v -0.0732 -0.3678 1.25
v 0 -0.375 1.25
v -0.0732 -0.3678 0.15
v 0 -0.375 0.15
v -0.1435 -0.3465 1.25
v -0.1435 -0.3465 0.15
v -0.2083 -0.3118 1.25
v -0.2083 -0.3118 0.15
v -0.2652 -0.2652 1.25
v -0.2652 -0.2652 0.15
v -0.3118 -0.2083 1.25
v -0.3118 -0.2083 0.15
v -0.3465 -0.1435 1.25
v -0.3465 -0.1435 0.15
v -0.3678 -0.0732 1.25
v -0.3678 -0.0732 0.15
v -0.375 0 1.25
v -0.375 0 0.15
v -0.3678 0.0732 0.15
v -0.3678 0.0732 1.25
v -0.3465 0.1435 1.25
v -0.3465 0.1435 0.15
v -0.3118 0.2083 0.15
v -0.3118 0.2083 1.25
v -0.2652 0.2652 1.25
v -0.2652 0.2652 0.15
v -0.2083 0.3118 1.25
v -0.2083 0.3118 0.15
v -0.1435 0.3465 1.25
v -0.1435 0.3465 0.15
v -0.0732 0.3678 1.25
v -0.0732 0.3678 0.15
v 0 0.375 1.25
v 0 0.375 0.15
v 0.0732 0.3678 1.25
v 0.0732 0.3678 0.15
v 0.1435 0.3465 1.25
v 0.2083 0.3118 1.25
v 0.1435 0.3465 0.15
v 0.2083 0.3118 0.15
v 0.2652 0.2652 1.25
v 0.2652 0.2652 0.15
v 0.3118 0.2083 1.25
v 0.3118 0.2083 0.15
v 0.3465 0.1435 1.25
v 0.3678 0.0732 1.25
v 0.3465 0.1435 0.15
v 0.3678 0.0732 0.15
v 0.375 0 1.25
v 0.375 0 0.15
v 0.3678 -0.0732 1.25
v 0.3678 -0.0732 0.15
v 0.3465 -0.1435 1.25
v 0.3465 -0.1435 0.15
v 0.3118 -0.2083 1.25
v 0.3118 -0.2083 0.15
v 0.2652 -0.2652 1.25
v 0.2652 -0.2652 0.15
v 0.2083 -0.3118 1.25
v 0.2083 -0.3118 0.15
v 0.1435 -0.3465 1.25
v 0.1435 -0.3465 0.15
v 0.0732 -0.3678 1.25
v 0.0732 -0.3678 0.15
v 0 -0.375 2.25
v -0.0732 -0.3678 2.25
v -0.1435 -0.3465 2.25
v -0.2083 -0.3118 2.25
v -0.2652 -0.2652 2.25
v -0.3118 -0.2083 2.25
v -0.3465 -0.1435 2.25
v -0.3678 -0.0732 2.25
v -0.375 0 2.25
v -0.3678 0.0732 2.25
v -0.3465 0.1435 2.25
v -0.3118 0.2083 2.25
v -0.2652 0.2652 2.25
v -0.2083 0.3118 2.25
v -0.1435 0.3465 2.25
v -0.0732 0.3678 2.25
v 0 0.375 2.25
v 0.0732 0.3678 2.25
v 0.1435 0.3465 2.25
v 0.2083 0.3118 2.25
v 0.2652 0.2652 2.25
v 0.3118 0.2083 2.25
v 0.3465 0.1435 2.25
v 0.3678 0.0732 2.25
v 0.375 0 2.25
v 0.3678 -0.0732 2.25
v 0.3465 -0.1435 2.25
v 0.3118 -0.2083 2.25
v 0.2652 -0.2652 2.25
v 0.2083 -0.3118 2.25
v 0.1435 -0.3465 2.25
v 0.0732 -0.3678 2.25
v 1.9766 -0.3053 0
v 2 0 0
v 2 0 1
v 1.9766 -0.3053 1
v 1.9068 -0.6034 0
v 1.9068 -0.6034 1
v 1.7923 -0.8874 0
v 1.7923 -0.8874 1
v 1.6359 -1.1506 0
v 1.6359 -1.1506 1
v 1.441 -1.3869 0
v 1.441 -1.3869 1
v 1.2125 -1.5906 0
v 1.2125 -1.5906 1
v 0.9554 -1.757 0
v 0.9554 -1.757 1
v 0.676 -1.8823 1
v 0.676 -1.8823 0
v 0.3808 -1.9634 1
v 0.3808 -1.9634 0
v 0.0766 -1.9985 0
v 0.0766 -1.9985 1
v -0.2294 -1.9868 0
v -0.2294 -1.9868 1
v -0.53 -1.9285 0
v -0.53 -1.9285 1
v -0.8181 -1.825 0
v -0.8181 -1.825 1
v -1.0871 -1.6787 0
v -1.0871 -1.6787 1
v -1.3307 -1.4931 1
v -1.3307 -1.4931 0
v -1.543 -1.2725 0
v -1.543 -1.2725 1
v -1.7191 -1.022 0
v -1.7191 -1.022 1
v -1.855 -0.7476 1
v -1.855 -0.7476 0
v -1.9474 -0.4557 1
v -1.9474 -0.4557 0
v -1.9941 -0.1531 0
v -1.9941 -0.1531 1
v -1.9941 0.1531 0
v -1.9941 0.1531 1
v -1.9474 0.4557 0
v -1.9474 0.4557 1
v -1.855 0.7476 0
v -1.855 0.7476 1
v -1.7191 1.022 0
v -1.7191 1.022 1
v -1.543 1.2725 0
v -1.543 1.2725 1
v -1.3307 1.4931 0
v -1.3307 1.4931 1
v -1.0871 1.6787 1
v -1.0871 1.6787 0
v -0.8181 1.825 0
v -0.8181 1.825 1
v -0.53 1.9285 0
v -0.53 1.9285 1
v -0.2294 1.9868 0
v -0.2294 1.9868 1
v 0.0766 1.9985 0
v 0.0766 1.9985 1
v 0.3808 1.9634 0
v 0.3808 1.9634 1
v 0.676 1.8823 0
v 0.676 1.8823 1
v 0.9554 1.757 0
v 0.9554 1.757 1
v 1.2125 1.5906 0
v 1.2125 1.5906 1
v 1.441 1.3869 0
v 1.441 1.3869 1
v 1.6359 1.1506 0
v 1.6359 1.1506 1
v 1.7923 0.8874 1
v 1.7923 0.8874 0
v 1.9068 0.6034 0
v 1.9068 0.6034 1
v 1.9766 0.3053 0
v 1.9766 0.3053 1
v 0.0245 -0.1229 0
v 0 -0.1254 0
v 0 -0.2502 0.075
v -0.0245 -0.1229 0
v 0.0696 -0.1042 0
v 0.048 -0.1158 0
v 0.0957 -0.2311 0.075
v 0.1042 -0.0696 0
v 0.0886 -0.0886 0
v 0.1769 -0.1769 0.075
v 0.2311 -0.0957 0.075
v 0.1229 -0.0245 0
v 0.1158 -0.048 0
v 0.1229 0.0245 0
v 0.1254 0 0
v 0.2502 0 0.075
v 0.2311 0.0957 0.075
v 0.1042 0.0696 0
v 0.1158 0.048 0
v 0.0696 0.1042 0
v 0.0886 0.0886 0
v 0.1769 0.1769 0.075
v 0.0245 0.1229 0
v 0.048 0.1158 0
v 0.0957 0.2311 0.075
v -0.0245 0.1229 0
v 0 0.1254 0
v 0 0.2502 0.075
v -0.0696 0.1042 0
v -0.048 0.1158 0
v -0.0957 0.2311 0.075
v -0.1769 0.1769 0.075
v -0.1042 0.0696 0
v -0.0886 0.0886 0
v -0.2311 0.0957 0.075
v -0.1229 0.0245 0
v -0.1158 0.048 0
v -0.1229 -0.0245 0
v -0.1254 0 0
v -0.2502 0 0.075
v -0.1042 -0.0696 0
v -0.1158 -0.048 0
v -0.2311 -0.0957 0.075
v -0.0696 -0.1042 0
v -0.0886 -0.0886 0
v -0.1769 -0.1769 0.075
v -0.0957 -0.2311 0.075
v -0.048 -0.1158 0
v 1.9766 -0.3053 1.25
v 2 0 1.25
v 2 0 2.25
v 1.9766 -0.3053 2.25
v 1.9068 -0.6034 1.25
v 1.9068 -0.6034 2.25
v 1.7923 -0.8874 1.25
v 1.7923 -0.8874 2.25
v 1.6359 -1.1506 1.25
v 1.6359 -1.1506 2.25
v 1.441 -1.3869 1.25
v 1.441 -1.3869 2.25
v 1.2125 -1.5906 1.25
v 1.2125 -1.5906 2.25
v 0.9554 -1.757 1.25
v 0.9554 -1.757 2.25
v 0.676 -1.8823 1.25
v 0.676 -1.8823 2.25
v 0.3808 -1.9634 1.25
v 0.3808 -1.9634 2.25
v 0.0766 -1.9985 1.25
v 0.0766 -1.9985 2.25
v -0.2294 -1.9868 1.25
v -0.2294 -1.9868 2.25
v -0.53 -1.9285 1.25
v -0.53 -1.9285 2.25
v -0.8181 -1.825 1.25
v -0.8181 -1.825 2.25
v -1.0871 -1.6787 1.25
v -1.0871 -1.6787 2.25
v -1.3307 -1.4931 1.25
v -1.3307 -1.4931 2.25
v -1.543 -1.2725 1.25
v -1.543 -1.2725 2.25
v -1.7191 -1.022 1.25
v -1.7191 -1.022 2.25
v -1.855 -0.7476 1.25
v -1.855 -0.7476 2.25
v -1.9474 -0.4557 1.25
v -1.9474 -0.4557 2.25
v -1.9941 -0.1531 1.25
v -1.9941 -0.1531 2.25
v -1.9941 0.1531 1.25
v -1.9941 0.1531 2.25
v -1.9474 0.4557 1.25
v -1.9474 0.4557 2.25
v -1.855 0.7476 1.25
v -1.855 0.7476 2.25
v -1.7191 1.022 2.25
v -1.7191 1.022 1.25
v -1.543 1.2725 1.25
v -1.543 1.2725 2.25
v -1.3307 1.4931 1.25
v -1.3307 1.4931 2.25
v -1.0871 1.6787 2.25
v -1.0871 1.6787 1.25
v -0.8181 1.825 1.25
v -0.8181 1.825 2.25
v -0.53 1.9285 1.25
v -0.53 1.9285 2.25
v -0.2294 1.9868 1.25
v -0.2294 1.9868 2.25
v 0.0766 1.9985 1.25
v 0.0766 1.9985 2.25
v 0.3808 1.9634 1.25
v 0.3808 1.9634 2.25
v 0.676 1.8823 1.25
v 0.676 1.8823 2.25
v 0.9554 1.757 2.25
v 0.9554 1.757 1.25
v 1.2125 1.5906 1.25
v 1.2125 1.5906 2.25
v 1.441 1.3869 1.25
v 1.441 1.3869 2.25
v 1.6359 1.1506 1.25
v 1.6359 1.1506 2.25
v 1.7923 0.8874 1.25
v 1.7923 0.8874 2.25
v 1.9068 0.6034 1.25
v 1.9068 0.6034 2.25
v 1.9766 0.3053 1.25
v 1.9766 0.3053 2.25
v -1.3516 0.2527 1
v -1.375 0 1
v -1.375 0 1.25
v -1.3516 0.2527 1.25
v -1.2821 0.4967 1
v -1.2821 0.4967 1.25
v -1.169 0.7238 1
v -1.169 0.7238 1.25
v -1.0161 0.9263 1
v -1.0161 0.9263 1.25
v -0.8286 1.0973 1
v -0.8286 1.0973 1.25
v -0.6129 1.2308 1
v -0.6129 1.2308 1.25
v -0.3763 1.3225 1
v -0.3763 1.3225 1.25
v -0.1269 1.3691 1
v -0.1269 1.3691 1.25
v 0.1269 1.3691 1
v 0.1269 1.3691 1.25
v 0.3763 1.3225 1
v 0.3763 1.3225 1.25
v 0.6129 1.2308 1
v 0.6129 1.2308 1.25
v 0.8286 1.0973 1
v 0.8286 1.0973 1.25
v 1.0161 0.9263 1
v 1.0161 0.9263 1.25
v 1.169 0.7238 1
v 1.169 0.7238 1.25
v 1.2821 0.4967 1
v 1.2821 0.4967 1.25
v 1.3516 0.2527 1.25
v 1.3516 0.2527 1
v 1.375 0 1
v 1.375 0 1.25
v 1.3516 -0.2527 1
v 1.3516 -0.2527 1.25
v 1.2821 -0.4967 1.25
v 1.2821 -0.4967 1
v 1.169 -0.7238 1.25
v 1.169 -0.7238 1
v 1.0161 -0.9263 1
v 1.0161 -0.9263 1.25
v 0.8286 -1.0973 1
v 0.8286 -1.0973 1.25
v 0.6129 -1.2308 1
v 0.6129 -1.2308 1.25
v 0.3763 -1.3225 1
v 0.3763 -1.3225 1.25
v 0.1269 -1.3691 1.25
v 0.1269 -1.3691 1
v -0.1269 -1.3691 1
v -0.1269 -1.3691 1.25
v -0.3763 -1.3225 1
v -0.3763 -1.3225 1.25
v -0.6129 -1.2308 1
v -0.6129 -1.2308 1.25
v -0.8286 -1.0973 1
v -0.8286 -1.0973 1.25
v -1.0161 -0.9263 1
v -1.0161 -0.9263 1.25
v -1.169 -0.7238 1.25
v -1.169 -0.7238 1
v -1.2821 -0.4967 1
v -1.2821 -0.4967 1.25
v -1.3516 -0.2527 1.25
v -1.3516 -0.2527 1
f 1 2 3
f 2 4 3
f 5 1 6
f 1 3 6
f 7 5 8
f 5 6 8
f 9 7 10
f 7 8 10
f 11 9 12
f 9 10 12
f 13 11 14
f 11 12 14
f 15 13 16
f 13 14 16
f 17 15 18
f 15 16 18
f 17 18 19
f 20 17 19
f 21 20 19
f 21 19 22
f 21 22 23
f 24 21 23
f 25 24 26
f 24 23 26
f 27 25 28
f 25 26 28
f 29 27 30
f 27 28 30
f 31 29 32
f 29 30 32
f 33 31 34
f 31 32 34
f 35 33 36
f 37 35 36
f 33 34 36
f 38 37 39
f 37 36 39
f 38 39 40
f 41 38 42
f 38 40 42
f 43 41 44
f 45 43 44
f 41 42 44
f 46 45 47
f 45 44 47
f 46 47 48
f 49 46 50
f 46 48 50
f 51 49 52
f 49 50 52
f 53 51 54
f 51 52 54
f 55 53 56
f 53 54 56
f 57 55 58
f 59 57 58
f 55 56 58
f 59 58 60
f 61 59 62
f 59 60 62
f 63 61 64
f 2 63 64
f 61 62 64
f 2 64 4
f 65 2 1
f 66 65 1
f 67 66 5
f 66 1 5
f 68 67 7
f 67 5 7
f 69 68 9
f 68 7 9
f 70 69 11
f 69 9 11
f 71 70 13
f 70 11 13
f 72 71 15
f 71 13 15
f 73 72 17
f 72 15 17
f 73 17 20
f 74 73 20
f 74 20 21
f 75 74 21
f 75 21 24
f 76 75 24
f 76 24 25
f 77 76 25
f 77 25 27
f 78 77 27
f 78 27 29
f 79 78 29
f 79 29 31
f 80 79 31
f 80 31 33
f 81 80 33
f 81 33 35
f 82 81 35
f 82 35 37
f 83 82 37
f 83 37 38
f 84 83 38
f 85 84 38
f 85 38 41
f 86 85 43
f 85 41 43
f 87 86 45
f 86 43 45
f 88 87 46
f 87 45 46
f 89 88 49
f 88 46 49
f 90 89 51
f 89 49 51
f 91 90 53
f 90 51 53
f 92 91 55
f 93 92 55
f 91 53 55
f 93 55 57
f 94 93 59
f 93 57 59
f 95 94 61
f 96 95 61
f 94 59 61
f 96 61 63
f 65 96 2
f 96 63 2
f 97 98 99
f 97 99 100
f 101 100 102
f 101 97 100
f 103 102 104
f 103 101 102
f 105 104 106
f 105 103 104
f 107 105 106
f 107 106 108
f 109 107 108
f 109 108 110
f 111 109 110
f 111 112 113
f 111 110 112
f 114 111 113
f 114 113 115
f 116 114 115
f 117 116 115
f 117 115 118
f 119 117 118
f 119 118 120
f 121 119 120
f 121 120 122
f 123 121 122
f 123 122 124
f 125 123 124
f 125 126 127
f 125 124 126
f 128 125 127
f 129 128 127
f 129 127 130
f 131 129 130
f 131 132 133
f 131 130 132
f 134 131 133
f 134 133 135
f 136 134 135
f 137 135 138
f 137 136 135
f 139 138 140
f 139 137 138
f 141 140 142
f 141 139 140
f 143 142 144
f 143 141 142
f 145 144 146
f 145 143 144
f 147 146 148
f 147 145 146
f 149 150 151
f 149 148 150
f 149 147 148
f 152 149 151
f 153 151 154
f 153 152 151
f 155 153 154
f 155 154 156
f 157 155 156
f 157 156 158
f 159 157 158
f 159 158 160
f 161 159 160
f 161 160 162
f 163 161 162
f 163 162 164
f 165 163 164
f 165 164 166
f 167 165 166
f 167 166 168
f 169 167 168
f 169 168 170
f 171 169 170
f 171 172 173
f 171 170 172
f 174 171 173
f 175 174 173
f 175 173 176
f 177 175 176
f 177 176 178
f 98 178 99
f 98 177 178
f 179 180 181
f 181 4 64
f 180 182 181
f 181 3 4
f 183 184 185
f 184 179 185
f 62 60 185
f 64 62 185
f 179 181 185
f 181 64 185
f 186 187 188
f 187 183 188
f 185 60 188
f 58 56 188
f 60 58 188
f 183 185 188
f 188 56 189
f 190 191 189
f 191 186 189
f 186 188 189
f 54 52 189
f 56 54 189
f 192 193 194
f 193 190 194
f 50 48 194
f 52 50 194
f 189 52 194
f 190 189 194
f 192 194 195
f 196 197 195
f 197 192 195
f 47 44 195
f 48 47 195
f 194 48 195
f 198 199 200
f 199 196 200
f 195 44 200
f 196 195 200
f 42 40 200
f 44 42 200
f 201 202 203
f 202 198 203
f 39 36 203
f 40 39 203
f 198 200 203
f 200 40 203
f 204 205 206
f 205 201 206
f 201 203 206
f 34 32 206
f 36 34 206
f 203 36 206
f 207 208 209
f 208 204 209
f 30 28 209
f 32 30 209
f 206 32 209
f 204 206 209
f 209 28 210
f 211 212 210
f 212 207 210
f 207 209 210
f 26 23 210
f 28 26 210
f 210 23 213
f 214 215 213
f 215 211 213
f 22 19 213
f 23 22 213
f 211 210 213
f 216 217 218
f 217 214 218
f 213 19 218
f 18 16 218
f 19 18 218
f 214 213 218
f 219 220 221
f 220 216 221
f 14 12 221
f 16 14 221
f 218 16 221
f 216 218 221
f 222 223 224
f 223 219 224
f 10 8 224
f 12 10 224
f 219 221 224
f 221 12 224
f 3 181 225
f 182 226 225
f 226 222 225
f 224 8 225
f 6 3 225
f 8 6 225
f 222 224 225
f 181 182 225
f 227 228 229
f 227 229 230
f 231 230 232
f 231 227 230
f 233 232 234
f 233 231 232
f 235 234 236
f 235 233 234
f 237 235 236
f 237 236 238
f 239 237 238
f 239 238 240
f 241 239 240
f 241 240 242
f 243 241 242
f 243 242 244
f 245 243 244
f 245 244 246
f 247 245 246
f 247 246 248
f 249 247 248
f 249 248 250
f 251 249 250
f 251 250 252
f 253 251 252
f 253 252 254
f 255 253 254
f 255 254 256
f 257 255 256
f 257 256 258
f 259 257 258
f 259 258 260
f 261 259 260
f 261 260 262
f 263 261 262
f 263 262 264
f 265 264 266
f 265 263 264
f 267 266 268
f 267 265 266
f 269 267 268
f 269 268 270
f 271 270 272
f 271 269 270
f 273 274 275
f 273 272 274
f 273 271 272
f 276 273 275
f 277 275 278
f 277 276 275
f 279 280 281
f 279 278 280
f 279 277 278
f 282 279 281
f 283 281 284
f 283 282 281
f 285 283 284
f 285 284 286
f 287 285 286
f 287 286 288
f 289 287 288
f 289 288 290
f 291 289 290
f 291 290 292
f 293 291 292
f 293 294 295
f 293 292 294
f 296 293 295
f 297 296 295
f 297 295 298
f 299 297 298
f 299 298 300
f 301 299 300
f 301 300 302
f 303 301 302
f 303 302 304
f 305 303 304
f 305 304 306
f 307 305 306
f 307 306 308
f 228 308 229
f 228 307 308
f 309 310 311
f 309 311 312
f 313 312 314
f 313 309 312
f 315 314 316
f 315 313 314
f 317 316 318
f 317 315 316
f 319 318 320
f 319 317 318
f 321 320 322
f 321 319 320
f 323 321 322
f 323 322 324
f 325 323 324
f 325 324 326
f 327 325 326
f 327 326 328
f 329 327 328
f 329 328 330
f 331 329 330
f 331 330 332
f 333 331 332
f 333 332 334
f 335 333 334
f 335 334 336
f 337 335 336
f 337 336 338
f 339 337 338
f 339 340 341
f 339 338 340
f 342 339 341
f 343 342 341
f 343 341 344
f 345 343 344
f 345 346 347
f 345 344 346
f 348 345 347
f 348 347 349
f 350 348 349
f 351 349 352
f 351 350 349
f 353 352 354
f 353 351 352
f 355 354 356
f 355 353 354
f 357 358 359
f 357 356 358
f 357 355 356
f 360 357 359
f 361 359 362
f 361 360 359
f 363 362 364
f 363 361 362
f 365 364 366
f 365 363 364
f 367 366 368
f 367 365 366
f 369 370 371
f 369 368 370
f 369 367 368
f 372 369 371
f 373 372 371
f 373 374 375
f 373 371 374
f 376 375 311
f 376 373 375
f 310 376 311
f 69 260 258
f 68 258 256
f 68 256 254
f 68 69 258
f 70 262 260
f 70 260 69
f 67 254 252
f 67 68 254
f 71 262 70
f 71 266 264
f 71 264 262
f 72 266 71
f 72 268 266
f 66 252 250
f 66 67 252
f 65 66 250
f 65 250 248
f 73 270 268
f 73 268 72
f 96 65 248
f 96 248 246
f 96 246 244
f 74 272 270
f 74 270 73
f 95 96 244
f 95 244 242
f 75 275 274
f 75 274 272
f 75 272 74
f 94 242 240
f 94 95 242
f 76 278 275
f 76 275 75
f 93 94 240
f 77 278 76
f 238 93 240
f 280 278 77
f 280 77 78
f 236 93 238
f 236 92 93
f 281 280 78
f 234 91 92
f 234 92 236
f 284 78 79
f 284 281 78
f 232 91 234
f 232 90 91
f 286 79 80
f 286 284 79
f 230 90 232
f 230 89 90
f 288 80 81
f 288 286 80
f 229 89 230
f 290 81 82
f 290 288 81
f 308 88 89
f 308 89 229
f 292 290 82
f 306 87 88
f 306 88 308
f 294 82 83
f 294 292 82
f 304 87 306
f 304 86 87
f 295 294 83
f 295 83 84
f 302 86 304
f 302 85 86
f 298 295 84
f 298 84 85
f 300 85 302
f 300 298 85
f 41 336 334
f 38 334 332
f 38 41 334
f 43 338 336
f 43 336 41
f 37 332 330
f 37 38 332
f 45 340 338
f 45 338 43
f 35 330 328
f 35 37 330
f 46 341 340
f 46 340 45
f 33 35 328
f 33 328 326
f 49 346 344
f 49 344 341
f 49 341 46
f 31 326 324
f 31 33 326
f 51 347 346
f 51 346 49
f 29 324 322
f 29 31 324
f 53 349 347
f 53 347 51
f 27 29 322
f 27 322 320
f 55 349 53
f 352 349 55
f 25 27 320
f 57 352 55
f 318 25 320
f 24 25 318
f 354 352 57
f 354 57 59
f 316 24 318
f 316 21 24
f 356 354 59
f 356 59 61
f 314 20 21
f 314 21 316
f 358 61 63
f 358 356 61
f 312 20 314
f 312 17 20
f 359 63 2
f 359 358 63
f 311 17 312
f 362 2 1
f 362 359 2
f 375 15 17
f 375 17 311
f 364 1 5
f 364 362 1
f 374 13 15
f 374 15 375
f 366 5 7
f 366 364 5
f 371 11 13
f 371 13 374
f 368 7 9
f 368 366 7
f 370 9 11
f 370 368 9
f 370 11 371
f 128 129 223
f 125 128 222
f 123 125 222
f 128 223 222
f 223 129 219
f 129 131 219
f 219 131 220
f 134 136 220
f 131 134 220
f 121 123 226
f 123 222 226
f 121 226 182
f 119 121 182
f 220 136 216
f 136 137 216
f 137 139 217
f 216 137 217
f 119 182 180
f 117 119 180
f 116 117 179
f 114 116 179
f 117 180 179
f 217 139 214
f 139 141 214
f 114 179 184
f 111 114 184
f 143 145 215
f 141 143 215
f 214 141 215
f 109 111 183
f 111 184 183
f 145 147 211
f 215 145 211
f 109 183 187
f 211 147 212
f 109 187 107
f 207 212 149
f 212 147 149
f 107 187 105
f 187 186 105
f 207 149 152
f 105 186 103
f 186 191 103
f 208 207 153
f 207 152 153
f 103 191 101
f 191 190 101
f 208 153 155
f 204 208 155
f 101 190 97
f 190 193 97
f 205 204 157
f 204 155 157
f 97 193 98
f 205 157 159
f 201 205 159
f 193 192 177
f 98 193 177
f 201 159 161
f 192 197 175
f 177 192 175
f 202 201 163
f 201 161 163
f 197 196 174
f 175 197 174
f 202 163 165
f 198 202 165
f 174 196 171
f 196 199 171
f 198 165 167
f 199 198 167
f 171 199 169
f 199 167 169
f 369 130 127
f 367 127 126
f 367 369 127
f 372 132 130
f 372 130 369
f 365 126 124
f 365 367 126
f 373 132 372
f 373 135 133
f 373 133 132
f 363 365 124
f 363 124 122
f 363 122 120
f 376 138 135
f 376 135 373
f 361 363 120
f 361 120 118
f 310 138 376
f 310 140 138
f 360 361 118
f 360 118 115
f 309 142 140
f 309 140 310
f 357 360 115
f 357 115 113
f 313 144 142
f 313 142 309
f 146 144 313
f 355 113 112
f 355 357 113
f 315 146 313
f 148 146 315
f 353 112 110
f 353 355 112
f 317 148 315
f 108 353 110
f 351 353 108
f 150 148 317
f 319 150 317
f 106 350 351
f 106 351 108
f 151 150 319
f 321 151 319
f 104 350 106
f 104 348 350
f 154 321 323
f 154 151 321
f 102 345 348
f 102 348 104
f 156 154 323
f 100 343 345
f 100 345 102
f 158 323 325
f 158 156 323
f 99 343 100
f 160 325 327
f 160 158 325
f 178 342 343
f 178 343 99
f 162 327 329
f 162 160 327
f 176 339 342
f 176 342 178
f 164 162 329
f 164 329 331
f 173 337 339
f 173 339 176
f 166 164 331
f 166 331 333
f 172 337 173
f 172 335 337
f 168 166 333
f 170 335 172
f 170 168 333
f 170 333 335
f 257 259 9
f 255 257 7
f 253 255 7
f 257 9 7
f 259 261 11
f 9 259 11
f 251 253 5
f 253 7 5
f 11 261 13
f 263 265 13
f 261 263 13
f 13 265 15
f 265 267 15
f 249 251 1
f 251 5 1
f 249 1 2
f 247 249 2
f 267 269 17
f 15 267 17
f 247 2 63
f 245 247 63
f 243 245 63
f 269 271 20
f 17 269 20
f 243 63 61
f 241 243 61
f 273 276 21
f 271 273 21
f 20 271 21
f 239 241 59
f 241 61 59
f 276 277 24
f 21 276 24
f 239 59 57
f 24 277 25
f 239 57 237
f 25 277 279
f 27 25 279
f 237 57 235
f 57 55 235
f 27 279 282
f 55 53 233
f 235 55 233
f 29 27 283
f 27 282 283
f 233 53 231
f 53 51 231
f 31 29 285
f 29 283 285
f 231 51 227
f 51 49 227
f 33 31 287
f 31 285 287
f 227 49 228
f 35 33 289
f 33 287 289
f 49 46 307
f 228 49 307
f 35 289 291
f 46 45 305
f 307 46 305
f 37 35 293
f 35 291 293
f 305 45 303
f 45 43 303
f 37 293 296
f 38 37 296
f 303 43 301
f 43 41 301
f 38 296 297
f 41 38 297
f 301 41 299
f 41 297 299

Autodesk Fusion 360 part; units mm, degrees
sketch "Sketch1" plane through (0, 0, 0) normal (0, 0, 1) x (1, 0, 0)
  circle A0 centre (0, 0) radius 2
  dimension "d1" = 4
extrude "Extrude1" add sketch "Sketch1" along normal blind 1 makes body 1
sketch "Sketch2" plane through (0, 0, 1) normal (0, 0, 1) x (-1, 0, 0)
  circle A0 centre (0, 0) radius 2
  circle A1 centre (0, 0) radius 1.375
  dimension "d4" = 2.75
extrude "Extrude2" add sketch "Sketch2" along normal blind 0.25 contours A1 bodies 1
sketch "Sketch3" plane through (0, 0, 0) normal (0, 0, 1) x (1, 0, 0)
  circle A0 centre (0, 0) radius 1.5
  circle A1 centre (0, 0) radius 2
  dimension "d7" = 3
  dimension "d8" = 4
extrude "Extrude3" add sketch "Sketch3" along normal blind 2.25 and the other way blind -1.25 separate body contours A0 | A1 makes body 2
hole "Hole1" at (0, 0, 2.25) direction (0, 0, -1) diameter 0.75 depth 2.1 tip angle 118 bodies 1 2
